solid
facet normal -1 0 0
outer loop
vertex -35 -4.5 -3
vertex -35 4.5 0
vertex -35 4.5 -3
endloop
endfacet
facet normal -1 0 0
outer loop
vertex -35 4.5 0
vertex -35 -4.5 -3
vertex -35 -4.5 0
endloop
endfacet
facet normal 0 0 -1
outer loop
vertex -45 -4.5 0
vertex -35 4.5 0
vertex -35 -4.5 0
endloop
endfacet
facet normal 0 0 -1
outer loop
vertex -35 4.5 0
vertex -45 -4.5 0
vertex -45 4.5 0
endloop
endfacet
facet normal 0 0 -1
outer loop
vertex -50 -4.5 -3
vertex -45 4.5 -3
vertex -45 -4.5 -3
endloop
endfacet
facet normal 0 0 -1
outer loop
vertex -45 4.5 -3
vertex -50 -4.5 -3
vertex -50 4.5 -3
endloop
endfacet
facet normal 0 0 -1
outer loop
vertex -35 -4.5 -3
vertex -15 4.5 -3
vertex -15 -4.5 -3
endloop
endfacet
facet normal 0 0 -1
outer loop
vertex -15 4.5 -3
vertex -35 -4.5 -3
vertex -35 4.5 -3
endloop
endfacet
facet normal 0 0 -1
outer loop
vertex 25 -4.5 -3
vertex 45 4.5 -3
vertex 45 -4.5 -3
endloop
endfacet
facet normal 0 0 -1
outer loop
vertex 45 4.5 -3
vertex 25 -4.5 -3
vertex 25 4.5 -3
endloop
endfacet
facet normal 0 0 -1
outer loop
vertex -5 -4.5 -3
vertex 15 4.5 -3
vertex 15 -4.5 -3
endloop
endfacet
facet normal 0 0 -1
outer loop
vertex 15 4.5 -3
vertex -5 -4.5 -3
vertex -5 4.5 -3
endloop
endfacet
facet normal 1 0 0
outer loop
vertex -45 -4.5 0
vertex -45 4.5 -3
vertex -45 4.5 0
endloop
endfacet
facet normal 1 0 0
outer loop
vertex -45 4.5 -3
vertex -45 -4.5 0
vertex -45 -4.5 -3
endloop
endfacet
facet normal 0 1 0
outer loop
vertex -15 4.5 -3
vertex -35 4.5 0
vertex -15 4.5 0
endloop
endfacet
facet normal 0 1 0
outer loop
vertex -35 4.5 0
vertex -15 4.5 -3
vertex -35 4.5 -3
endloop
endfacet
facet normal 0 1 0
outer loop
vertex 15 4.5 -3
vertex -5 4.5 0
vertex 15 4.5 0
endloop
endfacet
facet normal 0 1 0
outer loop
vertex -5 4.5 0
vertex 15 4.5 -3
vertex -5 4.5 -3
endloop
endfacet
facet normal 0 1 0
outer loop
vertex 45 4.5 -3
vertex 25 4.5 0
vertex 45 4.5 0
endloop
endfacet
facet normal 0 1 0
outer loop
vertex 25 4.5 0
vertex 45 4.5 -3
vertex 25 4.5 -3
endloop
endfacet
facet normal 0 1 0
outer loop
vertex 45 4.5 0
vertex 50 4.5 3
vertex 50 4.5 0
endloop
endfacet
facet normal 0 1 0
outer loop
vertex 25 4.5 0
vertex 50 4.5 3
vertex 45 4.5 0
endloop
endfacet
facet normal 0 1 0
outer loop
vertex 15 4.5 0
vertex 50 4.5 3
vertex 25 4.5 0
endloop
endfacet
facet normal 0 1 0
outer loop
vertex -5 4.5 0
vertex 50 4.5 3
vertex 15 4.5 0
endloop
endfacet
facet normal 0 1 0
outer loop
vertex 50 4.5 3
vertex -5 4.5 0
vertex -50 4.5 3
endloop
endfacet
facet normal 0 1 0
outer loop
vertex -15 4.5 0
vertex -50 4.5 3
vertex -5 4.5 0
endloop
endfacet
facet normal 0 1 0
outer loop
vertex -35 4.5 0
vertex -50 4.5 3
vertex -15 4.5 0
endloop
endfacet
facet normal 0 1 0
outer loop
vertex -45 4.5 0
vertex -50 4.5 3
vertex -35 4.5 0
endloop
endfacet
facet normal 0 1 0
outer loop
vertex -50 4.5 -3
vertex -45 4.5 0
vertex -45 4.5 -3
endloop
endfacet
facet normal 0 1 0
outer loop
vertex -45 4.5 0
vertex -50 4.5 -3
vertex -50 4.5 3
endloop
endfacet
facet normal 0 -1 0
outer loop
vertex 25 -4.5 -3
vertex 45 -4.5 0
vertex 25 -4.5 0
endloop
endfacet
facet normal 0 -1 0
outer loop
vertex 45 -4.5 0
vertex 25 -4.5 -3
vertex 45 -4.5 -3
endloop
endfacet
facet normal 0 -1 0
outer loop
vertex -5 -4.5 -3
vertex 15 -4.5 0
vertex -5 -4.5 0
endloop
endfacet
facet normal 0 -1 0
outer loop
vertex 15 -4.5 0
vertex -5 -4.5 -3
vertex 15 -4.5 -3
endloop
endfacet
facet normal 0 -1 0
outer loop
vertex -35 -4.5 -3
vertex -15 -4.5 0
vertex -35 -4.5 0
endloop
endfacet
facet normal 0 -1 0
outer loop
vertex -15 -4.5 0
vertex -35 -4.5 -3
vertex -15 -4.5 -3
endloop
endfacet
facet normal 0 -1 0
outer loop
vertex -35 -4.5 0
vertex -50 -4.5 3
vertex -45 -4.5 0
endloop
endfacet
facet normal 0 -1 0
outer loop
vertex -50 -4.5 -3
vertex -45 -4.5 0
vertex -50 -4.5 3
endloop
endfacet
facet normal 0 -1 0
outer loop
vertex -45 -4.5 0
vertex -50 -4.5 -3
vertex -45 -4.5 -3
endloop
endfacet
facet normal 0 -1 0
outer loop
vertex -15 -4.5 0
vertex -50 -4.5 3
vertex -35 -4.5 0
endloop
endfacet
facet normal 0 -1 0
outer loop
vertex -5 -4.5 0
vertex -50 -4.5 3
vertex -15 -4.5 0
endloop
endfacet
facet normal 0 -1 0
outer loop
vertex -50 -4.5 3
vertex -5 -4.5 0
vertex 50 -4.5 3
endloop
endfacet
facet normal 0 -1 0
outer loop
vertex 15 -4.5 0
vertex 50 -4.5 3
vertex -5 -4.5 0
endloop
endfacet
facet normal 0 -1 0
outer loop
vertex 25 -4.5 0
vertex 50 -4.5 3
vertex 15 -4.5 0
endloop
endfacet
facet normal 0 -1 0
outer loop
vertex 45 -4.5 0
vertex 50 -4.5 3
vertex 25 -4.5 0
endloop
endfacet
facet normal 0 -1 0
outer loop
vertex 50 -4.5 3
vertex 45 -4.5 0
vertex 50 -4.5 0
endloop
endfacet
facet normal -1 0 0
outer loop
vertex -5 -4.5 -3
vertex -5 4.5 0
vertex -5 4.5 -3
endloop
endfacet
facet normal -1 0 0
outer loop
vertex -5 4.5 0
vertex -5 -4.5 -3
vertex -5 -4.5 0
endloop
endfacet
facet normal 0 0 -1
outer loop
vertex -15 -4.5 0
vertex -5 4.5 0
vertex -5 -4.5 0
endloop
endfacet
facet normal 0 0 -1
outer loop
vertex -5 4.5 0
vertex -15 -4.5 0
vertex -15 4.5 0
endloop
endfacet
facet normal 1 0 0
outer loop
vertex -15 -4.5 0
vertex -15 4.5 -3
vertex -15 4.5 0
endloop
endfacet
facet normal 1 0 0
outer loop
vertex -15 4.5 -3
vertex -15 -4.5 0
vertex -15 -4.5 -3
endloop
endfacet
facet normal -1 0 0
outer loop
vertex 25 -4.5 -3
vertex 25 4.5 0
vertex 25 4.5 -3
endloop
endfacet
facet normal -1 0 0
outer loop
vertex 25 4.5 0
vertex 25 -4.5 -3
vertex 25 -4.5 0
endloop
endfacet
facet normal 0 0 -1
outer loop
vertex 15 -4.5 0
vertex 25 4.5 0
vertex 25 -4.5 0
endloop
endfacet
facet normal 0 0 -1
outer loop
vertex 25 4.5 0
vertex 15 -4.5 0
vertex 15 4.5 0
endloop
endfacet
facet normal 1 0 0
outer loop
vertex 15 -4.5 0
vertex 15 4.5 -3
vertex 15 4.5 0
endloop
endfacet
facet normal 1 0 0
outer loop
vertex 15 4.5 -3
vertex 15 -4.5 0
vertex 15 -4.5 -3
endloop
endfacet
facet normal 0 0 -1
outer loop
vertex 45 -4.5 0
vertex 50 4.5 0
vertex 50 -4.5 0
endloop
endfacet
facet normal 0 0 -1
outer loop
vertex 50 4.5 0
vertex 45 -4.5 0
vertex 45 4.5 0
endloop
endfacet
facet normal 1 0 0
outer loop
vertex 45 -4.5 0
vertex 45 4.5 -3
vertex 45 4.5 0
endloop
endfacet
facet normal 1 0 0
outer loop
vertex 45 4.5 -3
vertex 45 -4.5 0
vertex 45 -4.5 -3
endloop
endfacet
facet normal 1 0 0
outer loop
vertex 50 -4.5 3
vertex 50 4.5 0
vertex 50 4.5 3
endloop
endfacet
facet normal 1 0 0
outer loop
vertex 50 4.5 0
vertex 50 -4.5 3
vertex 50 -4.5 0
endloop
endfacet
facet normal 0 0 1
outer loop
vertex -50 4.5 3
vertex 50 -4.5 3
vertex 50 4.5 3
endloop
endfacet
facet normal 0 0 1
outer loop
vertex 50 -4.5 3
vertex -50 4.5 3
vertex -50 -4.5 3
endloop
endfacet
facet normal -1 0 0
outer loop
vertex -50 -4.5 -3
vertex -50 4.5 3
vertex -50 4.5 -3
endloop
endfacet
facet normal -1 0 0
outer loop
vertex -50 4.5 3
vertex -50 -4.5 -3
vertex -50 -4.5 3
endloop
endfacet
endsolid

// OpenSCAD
module linear_guide_rail() {
    difference() {
        // Main body of the rail
        translate([-50, -4.5, -3])
            cube([100, 9, 6]);
        
        // Cutouts for the rail
        for (i = [-45, -15, 15, 45]) {
            translate([i, -4.5, -3])
                cube([10, 9, 3]);
        }
    }
}

linear_guide_rail();
